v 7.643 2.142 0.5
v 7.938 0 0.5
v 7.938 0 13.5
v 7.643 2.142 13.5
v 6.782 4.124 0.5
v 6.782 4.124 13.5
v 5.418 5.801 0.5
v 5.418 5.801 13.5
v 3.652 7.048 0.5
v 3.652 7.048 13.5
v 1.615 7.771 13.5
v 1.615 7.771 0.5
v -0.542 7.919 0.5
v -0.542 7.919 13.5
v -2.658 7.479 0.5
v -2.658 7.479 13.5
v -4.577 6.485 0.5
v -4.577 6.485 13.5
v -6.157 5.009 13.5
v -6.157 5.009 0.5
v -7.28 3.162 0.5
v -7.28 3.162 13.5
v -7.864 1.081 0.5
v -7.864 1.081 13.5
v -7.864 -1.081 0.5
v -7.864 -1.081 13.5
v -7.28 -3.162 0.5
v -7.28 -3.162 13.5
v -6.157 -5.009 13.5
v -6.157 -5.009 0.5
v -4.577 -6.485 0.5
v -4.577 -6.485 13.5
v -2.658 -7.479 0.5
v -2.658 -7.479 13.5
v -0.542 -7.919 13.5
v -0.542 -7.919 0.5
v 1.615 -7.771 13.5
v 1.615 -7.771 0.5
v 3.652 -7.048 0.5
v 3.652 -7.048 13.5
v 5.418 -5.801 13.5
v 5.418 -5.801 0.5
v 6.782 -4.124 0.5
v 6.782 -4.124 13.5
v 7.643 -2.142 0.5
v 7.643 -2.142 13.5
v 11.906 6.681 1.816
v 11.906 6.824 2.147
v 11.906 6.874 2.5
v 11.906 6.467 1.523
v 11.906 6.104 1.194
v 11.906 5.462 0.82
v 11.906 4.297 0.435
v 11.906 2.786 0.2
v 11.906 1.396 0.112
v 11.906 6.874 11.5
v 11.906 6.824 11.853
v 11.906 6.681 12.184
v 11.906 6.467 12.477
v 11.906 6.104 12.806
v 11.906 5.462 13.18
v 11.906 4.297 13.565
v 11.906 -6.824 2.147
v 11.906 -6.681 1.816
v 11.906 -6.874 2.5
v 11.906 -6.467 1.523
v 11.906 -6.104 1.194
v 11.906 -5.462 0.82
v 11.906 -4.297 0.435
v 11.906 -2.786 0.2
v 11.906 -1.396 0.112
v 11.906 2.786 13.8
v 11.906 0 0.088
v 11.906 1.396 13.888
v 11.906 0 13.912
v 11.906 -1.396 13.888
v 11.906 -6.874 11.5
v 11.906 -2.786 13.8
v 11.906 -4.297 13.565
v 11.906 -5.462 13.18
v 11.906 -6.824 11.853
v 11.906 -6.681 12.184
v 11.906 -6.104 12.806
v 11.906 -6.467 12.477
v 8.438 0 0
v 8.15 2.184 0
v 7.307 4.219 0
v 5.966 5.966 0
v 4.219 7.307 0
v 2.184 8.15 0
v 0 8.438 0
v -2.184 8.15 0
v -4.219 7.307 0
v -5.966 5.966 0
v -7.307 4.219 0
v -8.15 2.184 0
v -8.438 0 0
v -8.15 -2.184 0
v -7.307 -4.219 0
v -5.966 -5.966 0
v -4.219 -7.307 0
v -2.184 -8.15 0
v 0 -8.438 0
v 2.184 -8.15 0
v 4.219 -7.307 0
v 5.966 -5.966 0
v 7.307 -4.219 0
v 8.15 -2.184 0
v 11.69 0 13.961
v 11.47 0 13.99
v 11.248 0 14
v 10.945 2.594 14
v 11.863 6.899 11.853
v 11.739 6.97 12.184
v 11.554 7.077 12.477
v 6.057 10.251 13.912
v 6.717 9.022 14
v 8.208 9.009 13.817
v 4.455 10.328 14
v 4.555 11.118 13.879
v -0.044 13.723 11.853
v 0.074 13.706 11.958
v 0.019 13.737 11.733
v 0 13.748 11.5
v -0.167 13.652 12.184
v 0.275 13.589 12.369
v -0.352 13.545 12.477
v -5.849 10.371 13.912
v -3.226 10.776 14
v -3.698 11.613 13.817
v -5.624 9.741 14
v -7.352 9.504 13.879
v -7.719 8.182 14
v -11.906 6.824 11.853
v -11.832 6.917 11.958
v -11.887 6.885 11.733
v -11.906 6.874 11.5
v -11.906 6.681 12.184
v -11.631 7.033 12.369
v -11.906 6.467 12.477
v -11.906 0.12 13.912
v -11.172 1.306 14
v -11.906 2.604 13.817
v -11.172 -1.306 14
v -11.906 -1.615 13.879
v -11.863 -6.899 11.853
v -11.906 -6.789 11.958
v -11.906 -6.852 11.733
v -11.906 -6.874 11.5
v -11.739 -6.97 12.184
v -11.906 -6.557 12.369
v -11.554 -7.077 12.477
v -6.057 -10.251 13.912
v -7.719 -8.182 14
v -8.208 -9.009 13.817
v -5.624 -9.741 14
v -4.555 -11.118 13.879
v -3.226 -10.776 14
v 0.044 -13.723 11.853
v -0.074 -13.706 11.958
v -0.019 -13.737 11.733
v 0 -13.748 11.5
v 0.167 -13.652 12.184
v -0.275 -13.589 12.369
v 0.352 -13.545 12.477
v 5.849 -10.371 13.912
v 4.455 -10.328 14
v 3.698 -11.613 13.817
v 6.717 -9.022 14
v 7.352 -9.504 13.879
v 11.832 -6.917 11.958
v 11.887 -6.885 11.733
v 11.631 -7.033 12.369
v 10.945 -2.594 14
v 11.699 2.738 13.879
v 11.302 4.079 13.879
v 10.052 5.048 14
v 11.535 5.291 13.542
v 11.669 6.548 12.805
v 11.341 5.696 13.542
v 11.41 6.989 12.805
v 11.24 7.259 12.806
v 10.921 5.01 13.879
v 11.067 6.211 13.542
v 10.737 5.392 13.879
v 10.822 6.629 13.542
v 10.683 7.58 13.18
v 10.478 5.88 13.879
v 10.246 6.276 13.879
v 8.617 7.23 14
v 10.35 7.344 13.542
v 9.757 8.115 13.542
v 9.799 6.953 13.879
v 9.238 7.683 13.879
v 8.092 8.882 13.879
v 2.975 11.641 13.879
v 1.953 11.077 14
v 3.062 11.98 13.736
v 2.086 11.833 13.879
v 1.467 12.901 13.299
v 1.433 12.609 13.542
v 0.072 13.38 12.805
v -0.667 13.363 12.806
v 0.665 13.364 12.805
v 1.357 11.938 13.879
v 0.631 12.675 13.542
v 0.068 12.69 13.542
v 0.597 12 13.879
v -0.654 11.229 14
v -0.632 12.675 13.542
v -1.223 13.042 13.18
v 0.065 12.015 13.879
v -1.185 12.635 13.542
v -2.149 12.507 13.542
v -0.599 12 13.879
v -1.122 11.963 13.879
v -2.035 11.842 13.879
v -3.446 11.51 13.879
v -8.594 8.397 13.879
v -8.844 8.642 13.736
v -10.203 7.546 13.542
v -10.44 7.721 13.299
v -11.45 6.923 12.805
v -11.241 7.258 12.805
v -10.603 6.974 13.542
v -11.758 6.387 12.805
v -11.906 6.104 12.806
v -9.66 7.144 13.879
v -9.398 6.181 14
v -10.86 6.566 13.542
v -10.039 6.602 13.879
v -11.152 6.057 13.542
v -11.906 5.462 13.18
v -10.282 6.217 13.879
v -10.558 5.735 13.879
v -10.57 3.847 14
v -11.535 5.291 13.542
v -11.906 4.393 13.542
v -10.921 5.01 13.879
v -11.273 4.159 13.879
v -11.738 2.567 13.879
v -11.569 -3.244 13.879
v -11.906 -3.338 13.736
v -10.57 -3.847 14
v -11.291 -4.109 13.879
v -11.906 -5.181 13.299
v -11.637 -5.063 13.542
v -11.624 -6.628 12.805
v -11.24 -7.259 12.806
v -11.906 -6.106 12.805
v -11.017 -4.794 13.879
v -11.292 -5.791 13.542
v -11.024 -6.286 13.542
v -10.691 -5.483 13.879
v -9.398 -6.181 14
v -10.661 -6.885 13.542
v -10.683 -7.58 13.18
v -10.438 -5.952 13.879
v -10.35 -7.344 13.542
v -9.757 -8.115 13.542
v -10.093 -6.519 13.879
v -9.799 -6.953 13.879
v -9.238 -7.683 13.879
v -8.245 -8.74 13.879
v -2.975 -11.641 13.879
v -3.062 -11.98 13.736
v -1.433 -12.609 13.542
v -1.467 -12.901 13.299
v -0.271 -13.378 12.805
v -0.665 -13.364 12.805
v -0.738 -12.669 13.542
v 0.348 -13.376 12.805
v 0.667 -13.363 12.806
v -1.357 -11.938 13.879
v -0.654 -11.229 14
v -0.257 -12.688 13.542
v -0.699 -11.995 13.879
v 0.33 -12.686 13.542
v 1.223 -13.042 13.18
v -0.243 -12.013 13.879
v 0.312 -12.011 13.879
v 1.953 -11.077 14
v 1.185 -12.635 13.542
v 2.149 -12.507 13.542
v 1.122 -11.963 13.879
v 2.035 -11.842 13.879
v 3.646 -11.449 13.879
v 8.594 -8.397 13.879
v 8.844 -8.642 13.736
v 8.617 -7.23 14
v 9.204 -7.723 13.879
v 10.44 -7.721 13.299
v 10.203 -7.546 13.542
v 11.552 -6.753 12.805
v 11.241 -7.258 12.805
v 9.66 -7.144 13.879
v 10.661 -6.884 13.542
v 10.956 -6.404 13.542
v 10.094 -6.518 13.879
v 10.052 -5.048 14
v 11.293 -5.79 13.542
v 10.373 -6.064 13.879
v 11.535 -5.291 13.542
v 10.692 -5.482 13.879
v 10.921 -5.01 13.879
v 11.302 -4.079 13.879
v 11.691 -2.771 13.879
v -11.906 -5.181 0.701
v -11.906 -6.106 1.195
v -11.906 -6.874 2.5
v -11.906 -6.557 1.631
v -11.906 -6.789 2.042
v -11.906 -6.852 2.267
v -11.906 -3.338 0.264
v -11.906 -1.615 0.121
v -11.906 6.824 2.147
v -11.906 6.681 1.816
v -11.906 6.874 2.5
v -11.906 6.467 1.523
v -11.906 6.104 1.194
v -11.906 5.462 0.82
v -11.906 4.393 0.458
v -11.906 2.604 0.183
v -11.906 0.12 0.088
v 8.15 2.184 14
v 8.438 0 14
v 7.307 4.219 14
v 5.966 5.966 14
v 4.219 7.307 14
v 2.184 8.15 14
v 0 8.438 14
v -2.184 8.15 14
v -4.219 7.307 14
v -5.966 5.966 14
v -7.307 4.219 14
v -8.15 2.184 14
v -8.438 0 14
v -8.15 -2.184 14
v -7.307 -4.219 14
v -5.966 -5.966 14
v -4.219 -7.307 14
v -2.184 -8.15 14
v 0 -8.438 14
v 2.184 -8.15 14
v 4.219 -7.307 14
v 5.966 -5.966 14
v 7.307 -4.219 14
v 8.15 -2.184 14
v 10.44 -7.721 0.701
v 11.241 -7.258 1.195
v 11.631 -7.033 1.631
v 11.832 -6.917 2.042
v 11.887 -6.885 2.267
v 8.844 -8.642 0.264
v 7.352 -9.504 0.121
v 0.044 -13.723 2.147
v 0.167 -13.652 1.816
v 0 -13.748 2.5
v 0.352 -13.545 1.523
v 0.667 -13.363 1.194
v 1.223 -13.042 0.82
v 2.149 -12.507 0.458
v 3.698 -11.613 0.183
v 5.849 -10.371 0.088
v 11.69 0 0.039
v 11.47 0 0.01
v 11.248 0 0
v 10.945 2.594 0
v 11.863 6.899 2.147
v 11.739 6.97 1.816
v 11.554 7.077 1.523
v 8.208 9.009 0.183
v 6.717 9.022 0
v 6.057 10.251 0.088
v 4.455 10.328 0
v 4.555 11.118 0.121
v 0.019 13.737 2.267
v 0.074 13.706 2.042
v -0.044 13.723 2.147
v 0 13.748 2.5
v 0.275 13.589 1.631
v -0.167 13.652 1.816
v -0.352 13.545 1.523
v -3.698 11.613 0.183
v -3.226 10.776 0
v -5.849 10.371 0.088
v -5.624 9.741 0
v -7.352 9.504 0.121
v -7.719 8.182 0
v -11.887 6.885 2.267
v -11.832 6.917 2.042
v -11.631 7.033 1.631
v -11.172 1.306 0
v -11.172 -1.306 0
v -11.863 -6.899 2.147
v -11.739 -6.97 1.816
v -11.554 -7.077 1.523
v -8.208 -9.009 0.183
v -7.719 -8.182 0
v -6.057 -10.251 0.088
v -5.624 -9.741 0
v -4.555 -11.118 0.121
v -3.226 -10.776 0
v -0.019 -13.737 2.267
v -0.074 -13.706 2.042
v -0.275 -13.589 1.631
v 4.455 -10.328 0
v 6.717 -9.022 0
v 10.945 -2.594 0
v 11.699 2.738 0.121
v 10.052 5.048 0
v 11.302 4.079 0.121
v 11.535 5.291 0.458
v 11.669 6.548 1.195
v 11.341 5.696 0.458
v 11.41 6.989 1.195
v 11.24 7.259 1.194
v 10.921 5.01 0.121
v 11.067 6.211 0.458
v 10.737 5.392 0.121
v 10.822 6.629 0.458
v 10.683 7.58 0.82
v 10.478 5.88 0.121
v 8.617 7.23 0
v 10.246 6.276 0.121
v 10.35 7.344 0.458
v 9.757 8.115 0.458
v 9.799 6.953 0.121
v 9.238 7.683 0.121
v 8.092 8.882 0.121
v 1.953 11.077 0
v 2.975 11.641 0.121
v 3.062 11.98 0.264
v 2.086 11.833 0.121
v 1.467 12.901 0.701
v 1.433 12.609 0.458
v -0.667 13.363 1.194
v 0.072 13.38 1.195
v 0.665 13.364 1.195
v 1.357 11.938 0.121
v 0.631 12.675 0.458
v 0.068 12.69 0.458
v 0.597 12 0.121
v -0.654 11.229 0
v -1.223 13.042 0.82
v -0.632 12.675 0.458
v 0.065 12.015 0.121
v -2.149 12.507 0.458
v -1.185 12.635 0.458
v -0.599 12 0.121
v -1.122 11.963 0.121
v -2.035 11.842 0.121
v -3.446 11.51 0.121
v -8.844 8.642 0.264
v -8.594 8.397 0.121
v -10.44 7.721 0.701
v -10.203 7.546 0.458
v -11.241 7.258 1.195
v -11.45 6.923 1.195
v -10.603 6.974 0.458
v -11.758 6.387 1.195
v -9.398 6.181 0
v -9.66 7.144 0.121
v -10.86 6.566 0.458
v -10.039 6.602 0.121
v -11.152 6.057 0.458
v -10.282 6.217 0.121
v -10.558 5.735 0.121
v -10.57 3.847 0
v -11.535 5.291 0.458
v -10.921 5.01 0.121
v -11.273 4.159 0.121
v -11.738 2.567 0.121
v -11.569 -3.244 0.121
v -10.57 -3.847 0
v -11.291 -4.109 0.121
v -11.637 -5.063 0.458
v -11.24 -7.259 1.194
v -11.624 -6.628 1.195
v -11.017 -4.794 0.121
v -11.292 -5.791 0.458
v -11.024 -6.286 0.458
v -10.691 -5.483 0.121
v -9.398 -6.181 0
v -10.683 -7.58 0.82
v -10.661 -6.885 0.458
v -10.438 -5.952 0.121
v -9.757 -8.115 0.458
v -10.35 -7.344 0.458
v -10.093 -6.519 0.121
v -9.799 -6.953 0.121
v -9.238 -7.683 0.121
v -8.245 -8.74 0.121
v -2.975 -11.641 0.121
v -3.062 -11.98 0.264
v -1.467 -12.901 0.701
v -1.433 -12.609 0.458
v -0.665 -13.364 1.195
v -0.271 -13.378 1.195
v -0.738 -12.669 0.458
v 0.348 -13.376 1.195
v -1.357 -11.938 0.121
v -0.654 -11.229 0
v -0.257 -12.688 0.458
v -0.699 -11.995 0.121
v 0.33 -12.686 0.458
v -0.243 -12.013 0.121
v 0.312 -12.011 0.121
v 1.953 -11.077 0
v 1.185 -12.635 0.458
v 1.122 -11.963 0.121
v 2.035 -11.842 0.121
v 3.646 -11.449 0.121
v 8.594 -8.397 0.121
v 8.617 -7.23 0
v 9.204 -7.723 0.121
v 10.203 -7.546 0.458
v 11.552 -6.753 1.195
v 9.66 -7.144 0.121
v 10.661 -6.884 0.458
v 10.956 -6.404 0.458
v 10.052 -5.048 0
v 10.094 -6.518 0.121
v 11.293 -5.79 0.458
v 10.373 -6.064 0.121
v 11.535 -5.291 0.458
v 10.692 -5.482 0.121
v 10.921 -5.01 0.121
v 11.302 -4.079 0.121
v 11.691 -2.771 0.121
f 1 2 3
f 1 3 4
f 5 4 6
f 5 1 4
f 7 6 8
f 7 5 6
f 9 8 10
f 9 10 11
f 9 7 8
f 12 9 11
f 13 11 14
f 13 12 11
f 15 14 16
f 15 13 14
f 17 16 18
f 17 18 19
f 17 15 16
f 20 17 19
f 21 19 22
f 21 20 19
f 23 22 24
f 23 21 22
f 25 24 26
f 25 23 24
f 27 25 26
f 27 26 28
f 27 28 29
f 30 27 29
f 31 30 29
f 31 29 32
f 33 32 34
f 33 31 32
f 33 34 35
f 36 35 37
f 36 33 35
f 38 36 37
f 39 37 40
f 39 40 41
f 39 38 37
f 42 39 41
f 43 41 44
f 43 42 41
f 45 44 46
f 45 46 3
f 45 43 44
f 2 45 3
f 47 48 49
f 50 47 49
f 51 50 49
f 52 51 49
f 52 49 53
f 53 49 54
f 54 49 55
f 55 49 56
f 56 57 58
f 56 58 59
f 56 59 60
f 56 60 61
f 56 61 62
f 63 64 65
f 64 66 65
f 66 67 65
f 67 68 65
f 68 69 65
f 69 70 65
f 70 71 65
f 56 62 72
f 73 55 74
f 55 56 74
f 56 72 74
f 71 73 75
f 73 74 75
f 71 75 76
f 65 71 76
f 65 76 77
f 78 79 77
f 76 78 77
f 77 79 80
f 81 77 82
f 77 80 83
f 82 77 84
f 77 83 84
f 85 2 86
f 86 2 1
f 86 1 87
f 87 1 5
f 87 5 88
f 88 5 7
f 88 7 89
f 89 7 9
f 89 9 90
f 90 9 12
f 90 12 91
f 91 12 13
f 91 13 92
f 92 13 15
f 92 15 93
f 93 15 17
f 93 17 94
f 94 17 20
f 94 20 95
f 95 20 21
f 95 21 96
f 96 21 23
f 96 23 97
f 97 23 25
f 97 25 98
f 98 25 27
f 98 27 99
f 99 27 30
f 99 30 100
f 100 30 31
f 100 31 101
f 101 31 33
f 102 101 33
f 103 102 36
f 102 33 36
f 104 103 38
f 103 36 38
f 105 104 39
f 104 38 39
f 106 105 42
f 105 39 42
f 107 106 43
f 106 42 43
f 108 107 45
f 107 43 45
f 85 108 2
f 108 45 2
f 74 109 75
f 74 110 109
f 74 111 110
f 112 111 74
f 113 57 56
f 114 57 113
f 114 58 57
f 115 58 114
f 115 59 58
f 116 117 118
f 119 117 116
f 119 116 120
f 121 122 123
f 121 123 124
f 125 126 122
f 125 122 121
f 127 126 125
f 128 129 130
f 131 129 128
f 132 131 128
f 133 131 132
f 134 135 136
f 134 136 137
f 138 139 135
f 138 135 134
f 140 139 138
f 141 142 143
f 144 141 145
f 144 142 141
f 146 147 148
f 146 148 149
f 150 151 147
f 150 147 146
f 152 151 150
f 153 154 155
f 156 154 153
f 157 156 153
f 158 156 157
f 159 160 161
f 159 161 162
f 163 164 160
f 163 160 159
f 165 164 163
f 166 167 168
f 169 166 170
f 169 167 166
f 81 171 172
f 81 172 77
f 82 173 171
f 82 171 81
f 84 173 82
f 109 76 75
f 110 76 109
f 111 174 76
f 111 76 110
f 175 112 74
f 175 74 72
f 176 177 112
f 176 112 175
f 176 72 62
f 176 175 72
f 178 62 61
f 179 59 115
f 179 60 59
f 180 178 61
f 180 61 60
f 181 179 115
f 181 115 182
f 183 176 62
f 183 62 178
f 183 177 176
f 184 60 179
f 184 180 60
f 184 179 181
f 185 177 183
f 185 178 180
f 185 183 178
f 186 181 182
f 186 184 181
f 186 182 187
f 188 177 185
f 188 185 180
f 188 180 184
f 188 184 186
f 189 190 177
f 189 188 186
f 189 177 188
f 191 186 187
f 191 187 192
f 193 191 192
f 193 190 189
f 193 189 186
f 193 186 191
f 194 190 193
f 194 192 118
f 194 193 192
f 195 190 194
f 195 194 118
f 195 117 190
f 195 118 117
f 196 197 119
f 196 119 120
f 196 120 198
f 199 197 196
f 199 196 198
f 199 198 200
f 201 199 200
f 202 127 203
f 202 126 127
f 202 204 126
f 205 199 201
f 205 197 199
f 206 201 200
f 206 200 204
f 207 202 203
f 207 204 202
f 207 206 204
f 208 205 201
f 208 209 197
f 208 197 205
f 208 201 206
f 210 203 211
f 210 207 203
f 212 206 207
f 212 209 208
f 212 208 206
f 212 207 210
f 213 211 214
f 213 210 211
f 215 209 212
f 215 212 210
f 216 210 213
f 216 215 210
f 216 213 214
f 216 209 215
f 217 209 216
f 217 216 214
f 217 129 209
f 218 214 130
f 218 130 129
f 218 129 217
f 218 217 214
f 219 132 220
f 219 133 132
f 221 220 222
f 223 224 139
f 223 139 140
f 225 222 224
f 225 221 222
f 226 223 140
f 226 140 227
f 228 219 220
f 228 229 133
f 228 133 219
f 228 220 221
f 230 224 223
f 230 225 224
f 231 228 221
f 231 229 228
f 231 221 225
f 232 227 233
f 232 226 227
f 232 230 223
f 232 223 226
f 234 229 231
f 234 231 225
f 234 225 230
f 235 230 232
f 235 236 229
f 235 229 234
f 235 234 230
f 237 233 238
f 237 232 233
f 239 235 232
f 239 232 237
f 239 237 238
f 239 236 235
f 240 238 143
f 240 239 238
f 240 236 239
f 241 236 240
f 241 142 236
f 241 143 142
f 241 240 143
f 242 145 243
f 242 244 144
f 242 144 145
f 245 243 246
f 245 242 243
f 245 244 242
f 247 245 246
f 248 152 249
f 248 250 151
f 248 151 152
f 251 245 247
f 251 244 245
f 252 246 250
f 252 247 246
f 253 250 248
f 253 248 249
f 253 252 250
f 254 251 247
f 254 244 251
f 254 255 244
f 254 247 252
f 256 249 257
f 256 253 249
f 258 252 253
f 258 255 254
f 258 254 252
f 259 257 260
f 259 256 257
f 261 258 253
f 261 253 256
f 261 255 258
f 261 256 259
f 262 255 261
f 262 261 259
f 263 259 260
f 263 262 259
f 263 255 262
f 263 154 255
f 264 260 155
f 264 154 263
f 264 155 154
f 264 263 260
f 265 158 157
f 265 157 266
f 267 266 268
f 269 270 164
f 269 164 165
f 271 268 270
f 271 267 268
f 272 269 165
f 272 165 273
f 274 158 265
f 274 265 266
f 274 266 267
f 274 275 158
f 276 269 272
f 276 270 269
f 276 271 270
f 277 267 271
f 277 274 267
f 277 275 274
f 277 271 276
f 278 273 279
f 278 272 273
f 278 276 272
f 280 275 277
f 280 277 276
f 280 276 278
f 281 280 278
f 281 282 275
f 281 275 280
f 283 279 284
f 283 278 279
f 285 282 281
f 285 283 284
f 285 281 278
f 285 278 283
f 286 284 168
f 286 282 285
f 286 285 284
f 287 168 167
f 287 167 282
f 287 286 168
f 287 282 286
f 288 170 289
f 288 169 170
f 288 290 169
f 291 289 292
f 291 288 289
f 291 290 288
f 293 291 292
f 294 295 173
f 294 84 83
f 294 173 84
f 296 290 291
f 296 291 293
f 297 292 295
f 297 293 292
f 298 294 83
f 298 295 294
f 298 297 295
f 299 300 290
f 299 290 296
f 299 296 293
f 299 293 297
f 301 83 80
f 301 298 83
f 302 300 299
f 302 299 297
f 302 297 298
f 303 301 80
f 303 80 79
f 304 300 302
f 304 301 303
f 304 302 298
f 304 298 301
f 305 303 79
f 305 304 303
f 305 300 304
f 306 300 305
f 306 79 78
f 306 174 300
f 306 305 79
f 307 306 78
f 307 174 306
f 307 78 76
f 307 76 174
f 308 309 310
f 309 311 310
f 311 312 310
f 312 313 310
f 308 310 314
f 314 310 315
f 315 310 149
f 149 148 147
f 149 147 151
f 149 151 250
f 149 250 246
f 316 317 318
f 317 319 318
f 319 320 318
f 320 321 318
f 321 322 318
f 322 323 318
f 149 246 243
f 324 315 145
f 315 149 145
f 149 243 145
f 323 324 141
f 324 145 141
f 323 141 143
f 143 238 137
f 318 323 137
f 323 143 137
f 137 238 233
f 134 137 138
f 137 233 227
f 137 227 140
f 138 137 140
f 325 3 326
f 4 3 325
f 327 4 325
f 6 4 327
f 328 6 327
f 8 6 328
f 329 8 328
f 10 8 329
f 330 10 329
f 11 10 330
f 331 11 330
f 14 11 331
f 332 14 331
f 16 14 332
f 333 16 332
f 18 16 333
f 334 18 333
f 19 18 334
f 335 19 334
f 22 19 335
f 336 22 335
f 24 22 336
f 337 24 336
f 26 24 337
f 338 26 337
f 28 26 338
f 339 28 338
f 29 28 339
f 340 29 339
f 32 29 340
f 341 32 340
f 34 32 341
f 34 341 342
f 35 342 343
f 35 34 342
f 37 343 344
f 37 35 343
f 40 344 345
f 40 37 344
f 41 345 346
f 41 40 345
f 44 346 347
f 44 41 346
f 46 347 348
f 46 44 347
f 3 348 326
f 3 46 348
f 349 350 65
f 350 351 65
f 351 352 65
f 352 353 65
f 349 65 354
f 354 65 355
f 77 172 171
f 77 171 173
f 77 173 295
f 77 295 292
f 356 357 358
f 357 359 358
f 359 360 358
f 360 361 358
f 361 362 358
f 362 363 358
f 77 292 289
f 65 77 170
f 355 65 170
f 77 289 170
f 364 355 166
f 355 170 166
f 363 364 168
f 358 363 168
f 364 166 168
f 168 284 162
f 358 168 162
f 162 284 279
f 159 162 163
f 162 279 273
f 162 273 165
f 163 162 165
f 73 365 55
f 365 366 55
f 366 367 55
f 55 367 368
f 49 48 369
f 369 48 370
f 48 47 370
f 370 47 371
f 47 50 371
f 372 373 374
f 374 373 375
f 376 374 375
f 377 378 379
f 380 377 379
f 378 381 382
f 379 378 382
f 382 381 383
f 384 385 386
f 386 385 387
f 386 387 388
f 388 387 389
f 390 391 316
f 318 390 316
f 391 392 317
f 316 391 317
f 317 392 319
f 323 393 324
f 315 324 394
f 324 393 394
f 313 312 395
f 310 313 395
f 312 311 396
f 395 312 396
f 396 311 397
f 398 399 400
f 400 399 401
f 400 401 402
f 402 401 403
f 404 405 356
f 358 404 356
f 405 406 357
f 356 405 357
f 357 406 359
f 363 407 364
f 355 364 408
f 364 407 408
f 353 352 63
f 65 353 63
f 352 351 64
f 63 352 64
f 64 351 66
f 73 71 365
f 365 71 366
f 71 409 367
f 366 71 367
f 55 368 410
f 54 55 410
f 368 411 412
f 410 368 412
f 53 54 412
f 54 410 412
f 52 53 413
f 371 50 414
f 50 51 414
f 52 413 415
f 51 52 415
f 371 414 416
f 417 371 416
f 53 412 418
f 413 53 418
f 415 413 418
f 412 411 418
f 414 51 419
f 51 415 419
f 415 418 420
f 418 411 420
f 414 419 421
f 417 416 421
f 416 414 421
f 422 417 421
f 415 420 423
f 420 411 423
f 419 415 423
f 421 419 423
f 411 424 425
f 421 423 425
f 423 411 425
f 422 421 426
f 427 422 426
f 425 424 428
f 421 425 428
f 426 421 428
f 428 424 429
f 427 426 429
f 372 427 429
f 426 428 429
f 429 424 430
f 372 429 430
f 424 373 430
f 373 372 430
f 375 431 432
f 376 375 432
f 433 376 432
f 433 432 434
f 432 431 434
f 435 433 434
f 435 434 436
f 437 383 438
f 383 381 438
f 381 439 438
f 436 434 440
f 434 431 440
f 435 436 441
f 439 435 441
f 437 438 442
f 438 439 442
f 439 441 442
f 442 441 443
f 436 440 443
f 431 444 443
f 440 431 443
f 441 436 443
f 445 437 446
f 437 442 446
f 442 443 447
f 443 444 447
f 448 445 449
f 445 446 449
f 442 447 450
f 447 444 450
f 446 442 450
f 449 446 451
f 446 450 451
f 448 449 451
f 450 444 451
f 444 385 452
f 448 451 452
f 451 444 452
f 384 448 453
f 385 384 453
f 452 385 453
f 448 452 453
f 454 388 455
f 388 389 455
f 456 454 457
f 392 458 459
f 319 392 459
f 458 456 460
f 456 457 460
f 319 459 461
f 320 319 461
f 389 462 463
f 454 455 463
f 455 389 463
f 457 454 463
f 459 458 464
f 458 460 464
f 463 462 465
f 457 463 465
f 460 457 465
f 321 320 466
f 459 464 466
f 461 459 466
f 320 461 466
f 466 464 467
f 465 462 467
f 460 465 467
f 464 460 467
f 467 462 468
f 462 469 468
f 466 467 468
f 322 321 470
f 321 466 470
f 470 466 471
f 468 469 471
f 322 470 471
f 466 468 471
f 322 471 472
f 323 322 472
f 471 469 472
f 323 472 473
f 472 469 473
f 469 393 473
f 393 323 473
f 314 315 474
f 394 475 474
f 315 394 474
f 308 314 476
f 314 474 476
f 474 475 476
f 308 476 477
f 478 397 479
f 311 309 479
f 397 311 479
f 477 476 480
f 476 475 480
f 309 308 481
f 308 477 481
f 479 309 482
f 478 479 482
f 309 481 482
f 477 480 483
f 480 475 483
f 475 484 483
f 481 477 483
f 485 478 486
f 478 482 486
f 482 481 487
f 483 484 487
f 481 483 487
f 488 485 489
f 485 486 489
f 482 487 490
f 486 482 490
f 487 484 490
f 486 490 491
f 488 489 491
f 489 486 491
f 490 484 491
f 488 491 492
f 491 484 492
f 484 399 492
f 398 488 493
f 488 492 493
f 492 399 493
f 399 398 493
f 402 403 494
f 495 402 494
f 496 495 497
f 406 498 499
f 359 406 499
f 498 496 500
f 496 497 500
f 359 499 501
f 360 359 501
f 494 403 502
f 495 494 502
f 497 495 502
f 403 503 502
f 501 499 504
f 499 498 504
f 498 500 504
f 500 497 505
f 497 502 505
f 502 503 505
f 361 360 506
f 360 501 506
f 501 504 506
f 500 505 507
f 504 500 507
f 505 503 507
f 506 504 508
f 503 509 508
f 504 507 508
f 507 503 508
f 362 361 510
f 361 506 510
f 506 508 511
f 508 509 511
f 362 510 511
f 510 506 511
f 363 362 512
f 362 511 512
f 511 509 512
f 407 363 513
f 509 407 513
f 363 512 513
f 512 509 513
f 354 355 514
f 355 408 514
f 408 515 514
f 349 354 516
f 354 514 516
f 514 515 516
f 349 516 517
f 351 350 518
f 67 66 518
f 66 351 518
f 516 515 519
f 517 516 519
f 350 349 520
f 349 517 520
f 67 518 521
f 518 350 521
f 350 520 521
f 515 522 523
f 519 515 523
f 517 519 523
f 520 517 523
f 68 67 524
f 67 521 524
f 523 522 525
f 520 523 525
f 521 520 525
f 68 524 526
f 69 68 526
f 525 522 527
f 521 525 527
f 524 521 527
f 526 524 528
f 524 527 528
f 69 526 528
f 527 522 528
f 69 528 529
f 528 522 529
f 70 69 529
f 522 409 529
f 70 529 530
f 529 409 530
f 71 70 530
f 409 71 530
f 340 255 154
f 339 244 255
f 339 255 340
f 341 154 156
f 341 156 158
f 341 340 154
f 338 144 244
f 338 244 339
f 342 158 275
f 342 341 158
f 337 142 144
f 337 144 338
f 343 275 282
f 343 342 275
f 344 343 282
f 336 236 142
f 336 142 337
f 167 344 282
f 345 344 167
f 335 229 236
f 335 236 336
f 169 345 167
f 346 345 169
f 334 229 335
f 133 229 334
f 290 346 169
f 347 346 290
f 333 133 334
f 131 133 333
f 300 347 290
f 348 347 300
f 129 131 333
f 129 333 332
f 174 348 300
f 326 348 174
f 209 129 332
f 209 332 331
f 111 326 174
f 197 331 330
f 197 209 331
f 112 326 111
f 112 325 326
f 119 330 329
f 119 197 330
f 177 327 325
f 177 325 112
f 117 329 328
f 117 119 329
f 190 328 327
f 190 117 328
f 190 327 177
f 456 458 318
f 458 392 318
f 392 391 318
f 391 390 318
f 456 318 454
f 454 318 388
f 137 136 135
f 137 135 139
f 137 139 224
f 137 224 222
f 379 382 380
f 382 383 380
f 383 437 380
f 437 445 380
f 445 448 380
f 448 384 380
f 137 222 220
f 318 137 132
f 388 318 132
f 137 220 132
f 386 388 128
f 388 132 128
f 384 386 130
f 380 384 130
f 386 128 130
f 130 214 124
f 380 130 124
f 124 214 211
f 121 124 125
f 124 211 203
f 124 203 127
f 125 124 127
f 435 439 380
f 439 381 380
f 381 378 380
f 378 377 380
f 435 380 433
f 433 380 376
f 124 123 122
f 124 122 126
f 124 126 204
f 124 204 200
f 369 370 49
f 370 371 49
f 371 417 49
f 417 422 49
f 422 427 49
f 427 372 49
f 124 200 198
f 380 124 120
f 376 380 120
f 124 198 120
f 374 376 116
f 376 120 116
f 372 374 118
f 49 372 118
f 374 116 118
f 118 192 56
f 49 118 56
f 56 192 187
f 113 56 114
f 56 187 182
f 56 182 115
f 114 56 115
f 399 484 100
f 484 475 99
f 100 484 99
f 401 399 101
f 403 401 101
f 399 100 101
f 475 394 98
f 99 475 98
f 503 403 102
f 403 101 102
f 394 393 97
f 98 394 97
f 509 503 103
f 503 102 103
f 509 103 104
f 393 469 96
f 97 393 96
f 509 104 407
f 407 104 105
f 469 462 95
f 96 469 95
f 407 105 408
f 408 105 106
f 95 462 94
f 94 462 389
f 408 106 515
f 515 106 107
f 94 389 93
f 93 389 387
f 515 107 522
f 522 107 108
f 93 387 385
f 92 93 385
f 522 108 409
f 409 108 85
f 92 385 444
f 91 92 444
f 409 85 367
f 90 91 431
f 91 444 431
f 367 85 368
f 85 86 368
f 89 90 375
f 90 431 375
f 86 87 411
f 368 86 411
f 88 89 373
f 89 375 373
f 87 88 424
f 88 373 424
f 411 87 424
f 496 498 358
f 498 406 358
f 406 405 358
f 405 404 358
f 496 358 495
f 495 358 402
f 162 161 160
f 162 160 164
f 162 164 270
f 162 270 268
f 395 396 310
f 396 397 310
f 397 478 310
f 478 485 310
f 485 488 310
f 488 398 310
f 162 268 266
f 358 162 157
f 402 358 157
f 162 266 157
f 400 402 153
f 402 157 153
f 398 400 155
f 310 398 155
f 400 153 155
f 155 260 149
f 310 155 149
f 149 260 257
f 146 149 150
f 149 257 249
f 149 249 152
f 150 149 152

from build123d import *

# Parameters (mm, degrees)
F0_R     = 13.748153
F0_R_2   = 7.9375
F1_DEPTH = 14
F3_R     = 2.5
F2_R     = 16.813718
F4_DEPTH = 25
F5_SIZE  = 0.5


with BuildPart() as f1:
    # F0 (on Top) → F1 (new body)
    with BuildSketch(Plane.XY):
        Circle(F0_R)
        Circle(F0_R_2, mode=Mode.SUBTRACT)
    extrude(amount=F1_DEPTH)

    # F3
    f3_edges = [f1.edges().sort_by_distance(p)[0] for p in [
        (-13.748153, 0, 14),
        (-13.748153, 0, 0),
    ]]
    fillet(f3_edges, radius=F3_R)

    # F2 (on face) → F4 (cut)
    with BuildSketch(Plane.XY.offset(14)):
        Circle(F2_R)
        Polygon((-11.90625, 6.874077), (0, 13.748153), (11.90625, 6.874077), (11.90625, -6.874077), (0, -13.748153), (-11.90625, -6.874077), align=None, mode=Mode.SUBTRACT)
    extrude(amount=-F4_DEPTH, mode=Mode.SUBTRACT)

    # F5
    f5_edges = [f1.edges().sort_by_distance(p)[0] for p in [
        (7.9375, 0, 7),
        (-7.9375, 0, 0),
        (-7.9375, 0, 14),
    ]]
    chamfer(f5_edges, length=F5_SIZE)


solid = f1.part
